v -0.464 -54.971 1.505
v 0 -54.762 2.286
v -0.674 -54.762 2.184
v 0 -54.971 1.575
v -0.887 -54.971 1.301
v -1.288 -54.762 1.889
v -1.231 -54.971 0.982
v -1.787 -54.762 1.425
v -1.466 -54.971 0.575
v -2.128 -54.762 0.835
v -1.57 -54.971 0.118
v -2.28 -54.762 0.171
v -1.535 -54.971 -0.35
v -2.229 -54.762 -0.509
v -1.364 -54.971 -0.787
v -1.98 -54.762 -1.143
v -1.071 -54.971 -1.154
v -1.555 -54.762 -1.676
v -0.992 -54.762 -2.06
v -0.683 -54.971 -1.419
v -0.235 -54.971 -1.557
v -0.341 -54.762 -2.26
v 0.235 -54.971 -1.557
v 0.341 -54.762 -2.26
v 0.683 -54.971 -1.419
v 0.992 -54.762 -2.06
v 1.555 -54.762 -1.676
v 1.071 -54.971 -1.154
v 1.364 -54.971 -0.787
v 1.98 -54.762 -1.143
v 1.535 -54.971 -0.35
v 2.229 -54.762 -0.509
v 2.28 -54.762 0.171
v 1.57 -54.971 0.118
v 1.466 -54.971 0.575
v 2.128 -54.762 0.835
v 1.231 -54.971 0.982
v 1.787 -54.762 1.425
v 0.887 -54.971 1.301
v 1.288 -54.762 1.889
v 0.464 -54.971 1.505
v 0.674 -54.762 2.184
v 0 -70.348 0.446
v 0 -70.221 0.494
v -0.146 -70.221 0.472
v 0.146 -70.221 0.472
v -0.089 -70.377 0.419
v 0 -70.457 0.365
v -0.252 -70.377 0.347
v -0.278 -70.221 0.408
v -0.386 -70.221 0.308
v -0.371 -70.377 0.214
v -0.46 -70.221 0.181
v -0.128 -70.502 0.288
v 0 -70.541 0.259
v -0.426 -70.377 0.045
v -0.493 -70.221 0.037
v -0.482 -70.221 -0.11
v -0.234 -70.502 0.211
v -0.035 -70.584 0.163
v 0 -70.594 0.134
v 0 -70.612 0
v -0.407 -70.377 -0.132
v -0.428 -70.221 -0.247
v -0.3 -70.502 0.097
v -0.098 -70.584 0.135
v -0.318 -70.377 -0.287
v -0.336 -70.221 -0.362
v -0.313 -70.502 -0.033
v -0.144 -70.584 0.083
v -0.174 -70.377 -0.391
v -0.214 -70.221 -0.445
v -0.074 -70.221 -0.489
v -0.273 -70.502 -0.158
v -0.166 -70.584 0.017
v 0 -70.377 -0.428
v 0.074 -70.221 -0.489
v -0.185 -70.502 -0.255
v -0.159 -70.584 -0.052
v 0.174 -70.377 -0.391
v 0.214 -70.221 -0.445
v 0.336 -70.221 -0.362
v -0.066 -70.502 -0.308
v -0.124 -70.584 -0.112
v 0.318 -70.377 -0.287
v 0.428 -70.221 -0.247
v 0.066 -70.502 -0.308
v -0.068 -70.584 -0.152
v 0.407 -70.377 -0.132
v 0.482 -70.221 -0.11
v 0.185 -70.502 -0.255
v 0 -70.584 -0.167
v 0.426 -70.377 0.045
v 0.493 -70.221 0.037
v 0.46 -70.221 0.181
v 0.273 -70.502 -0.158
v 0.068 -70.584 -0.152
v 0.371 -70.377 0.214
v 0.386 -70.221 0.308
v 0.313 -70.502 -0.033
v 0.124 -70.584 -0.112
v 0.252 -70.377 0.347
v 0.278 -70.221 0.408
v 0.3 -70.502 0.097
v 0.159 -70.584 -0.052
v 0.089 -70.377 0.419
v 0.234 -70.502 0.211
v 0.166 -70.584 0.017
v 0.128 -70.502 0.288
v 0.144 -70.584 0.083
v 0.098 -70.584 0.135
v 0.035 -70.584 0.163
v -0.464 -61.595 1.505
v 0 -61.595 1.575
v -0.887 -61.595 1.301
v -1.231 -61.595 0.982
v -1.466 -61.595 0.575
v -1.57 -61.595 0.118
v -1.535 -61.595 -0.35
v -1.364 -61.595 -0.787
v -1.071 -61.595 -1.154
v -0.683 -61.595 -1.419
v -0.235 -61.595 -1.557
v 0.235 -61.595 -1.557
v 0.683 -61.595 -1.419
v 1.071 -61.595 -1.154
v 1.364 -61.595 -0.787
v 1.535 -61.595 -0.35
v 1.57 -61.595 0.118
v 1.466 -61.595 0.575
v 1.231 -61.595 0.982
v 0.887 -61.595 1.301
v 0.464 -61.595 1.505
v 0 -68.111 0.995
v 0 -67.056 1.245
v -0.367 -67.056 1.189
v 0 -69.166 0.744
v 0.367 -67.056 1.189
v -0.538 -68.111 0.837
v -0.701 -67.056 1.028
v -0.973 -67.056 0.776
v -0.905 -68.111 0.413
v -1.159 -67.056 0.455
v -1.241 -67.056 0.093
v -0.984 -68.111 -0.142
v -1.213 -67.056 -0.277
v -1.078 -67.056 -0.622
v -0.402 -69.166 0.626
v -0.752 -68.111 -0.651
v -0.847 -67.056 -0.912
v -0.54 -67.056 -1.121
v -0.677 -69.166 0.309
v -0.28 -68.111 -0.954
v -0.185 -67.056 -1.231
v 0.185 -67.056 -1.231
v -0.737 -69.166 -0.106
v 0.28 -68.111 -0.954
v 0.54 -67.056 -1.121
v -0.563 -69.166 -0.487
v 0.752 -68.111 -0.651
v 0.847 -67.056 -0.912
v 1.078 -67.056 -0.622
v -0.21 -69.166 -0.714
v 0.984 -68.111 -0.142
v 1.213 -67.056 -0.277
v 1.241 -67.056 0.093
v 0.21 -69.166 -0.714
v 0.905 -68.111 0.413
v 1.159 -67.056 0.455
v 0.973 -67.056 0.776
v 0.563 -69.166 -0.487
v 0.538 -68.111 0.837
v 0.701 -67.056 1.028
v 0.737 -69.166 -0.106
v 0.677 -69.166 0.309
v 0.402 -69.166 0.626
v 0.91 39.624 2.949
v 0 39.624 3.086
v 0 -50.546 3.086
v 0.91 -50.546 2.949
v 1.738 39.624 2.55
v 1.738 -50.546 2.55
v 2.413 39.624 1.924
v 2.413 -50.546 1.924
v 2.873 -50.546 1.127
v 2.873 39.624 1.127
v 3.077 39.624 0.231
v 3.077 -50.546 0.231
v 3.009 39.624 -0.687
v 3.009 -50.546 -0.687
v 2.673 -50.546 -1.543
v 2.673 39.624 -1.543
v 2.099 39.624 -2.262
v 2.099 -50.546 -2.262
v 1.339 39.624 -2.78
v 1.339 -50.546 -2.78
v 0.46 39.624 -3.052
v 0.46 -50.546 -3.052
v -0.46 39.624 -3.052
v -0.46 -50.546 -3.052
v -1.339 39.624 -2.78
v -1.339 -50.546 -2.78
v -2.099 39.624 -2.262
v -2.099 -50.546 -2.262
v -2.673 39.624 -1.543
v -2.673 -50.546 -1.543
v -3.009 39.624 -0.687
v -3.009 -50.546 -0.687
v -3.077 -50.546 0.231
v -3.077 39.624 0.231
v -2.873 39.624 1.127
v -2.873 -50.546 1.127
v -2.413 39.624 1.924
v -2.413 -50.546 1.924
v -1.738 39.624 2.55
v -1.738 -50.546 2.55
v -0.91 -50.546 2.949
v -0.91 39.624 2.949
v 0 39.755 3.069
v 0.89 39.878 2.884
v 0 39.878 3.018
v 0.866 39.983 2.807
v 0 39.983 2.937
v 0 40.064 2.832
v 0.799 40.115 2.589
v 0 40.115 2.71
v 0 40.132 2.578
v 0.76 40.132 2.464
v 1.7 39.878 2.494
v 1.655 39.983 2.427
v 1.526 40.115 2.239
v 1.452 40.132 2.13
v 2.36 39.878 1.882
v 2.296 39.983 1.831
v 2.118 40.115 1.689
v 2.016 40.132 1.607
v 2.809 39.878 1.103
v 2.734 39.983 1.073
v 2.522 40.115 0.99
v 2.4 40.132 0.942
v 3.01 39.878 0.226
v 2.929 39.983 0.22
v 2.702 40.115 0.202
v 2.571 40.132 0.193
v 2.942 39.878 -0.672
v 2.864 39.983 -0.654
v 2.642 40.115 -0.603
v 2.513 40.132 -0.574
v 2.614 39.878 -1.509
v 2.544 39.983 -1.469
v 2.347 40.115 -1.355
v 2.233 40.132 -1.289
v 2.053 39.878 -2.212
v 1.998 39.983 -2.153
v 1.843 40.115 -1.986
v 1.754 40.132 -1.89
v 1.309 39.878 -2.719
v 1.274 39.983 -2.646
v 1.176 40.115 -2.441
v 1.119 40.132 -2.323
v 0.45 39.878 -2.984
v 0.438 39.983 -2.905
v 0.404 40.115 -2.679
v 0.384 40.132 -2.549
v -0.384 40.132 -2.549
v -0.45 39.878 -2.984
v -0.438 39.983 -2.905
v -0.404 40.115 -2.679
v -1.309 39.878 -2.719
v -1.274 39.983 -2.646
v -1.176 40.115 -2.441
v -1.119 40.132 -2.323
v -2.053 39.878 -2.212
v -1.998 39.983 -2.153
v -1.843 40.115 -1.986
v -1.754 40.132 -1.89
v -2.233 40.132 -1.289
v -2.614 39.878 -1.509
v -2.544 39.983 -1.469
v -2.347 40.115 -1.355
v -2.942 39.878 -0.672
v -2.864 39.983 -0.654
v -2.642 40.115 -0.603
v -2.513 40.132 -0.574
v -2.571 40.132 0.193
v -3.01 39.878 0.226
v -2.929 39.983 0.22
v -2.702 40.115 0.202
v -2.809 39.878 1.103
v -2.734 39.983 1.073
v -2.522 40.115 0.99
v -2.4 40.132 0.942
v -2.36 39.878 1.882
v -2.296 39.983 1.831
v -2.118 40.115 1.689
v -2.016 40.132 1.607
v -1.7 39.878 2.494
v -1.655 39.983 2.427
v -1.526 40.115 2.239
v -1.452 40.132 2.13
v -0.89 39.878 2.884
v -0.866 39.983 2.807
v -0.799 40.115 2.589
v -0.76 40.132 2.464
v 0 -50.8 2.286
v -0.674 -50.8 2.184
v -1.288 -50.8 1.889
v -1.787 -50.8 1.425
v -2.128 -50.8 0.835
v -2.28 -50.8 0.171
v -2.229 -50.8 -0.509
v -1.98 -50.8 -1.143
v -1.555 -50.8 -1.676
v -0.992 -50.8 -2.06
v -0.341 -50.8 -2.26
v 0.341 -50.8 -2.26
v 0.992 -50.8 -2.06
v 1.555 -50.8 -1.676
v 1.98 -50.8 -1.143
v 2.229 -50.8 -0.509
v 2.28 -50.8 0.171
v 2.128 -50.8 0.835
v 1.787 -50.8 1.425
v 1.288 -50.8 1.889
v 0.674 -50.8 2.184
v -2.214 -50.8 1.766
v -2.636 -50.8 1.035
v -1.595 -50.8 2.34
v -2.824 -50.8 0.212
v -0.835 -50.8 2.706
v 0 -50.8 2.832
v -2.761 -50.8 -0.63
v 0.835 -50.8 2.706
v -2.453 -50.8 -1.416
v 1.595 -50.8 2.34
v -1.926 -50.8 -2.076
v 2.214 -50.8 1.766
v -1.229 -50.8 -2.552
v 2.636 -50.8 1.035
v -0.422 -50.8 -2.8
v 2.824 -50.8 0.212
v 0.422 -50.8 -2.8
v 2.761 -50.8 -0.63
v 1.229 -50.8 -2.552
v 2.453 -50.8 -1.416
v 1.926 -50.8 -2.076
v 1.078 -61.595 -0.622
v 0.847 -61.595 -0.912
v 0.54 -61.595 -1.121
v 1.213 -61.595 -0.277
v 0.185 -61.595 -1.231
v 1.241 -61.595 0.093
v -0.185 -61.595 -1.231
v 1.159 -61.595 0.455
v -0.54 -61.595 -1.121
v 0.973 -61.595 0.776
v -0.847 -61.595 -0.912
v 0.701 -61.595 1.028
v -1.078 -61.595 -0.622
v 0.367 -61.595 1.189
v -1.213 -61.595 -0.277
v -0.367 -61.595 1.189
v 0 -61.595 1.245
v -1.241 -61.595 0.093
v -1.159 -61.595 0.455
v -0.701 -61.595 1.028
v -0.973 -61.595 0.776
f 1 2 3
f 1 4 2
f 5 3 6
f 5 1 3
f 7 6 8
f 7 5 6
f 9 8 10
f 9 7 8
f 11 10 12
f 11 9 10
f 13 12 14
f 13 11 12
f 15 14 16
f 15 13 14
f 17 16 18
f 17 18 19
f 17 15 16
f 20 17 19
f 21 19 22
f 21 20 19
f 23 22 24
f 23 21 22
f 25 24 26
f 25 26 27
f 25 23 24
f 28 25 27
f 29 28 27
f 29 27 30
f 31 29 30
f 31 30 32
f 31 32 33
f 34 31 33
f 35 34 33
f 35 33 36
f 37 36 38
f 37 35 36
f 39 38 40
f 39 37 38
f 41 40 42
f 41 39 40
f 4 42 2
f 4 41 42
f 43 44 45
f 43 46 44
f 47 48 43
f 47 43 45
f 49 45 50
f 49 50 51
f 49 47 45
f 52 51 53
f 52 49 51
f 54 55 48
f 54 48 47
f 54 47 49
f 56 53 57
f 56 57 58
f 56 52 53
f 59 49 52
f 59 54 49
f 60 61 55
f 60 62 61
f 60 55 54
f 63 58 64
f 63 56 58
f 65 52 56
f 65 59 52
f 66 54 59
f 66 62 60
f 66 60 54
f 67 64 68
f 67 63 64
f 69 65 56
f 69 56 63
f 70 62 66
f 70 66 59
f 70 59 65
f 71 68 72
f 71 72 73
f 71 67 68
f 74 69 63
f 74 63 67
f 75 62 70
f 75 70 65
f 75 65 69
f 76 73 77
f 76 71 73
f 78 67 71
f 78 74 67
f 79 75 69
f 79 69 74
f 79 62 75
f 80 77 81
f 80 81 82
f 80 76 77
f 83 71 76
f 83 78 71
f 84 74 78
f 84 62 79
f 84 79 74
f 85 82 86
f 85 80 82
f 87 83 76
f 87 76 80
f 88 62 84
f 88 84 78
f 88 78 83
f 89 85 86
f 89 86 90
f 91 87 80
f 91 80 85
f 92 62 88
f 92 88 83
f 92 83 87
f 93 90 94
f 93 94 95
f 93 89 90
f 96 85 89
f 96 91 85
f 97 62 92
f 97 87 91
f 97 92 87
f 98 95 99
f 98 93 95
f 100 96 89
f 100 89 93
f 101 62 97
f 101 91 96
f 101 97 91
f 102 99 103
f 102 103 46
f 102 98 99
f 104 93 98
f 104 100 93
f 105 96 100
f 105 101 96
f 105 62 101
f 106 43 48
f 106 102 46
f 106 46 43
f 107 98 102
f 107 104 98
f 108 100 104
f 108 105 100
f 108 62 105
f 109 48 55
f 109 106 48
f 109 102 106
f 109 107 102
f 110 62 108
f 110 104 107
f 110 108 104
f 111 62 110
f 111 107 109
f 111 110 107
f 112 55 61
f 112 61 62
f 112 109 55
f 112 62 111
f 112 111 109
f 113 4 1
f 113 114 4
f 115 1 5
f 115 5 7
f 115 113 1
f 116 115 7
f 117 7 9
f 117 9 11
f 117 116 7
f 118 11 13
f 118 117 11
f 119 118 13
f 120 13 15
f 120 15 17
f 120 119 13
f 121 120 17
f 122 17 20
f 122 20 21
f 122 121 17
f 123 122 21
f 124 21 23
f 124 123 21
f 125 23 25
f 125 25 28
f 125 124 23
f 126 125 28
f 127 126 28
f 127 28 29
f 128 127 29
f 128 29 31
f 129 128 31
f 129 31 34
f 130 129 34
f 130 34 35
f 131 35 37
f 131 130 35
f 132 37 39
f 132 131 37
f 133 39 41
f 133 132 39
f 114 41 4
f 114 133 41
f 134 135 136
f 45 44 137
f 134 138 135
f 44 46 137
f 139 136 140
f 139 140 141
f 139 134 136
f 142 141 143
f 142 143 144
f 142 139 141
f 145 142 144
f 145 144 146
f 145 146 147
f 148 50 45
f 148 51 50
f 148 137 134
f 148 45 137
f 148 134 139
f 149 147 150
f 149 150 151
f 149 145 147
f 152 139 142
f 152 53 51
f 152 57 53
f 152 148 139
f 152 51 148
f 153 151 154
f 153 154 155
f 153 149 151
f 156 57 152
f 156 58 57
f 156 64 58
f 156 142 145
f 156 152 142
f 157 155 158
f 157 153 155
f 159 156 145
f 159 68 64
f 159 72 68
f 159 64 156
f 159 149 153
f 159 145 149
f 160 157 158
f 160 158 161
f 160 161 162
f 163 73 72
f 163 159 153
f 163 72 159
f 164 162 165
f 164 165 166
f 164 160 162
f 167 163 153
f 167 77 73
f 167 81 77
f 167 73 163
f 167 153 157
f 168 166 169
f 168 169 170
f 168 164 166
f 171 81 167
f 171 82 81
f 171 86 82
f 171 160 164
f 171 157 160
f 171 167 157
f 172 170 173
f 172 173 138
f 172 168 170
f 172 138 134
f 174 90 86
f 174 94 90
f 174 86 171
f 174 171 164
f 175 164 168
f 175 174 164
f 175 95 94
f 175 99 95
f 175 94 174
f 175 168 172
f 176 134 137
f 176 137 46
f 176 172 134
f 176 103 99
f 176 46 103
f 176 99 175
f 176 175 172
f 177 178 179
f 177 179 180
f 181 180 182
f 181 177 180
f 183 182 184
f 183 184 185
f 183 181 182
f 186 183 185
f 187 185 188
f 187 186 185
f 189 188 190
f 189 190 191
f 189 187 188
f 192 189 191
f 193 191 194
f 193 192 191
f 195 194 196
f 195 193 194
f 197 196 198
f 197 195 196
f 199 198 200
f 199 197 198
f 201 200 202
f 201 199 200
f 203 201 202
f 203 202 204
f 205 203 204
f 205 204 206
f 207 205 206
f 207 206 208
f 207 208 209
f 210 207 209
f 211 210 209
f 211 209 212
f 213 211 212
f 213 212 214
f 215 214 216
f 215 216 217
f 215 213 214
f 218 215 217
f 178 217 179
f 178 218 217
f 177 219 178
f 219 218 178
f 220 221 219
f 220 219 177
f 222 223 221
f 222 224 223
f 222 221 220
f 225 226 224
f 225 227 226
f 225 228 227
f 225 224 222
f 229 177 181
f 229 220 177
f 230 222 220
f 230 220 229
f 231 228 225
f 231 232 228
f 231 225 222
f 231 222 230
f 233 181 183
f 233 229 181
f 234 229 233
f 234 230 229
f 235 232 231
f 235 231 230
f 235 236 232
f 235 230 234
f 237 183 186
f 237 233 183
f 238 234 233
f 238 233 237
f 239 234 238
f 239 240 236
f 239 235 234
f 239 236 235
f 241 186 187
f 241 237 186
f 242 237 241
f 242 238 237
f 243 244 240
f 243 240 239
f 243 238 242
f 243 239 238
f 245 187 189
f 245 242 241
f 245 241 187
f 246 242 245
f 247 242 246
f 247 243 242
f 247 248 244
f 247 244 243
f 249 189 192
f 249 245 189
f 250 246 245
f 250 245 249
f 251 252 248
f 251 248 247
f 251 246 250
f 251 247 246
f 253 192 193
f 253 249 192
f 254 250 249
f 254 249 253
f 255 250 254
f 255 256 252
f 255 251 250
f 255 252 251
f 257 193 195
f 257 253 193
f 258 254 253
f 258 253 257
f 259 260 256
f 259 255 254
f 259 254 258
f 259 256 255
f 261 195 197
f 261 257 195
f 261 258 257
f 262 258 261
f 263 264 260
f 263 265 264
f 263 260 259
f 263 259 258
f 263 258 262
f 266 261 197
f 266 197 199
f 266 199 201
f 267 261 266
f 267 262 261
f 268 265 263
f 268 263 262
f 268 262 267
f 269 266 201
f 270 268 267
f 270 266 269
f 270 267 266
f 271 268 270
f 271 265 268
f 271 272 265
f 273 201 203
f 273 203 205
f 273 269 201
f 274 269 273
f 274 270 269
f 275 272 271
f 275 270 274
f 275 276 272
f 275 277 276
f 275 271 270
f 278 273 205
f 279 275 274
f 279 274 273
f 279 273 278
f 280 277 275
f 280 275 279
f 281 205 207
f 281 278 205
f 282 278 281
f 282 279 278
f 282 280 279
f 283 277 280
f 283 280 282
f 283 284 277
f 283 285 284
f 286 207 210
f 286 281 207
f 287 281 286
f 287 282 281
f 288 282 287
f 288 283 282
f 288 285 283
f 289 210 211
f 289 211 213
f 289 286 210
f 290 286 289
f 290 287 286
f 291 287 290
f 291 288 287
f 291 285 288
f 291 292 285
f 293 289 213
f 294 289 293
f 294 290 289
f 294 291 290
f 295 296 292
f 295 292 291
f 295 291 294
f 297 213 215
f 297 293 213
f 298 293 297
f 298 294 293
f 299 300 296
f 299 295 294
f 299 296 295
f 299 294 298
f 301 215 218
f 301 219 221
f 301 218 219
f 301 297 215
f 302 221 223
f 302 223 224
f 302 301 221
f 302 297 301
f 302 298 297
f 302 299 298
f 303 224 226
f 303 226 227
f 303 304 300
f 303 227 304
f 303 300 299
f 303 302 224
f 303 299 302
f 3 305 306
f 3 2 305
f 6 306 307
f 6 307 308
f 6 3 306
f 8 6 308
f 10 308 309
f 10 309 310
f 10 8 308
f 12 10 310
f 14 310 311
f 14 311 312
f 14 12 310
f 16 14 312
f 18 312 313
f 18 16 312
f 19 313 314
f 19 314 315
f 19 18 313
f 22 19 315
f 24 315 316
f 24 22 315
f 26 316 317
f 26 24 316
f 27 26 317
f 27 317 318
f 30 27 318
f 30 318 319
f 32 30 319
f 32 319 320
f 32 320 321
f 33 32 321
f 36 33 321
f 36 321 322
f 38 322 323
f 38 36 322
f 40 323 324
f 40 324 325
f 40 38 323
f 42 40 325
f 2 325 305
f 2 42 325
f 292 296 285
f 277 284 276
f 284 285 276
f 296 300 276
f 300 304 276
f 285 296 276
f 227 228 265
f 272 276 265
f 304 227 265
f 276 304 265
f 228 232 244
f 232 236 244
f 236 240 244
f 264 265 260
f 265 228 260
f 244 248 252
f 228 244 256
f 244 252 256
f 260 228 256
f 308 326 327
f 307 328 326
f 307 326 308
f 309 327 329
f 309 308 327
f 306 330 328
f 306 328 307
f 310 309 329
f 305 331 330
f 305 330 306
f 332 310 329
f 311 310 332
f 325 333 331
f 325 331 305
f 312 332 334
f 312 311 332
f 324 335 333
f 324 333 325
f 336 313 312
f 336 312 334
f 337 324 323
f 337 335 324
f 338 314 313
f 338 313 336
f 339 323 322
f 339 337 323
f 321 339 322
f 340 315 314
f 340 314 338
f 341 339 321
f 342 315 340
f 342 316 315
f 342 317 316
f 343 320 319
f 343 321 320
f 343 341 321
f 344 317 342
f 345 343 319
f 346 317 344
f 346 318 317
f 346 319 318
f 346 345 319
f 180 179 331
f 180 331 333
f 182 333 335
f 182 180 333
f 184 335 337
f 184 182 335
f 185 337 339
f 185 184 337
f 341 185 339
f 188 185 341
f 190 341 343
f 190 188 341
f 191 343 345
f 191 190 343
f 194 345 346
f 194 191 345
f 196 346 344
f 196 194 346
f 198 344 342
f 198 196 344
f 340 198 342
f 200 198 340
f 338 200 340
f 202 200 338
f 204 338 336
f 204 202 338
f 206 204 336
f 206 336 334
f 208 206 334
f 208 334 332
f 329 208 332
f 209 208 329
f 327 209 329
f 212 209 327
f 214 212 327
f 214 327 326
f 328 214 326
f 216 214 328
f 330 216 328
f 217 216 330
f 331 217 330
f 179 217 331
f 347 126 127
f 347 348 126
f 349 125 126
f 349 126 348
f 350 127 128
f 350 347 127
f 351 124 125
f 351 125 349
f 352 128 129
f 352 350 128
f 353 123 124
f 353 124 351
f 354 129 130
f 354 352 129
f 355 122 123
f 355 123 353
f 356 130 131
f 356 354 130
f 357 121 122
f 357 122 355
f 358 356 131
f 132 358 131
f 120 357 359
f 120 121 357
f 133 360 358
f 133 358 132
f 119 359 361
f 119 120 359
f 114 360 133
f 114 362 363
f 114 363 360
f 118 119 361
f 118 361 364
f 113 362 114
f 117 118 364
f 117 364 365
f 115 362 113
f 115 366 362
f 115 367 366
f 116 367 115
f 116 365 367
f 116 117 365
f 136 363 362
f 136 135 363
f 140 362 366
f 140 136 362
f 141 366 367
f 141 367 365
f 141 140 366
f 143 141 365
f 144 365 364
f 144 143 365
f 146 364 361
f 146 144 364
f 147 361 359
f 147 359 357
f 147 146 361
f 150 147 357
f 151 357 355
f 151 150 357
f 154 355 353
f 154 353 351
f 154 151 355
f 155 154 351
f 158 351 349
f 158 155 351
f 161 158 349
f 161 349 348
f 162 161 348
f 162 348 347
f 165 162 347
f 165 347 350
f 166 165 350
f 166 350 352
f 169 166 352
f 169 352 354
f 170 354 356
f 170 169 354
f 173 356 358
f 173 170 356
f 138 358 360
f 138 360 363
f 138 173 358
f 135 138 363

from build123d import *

# Parameters (mm, degrees)
F0_W    = 90.932
F0_H    = 3.0861
F4_SIZE = 0.254
F5_R    = 0.508


with BuildPart() as f1:
    # F0 (on Right) → F1 (revolve)
    with BuildSketch(Plane.YZ):
        with Locations((-5.334, 1.54305)):
            Rectangle(F0_W, F0_H)
    revolve(axis=Axis((0, -5.334, 0), (0, 1, 0)))

    # F2 (on Right) → F3 (revolve)
    with BuildSketch(Plane.YZ):
        with BuildLine():
            Line((-70.612, 0), (-50.8, 0))
            Line((-50.8, 0), (-50.8, 1.2446))
            Line((-50.8, 1.2446), (-50.8, 2.286))
            Line((-50.8, 2.286), (-54.7624, 2.286))
            Line((-54.7624, 2.286), (-54.970556, 1.5748))
            Line((-54.970556, 1.5748), (-61.595, 1.5748))
            Line((-61.595, 1.5748), (-61.595, 1.2446))
            Line((-61.595, 1.2446), (-67.056, 1.2446))
            Line((-67.056, 1.2446), (-70.221173, 0.494302))
            ThreePointArc((-70.221173, 0.494302), (-70.50249, 0.315071), (-70.612, 0))
        make_face()
    revolve(axis=Axis((0, -60.706, 0), (0, -1, 0)))

    # F4
    f4_edges = [f1.edges().sort_by_distance(p)[0] for p in [
        (0, -50.8, -3.0861),
    ]]
    chamfer(f4_edges, length=F4_SIZE)

    # F5
    f5_edges = [f1.edges().sort_by_distance(p)[0] for p in [
        (0, 40.132, -3.0861),
    ]]
    fillet(f5_edges, radius=F5_R)


solid = f1.part
